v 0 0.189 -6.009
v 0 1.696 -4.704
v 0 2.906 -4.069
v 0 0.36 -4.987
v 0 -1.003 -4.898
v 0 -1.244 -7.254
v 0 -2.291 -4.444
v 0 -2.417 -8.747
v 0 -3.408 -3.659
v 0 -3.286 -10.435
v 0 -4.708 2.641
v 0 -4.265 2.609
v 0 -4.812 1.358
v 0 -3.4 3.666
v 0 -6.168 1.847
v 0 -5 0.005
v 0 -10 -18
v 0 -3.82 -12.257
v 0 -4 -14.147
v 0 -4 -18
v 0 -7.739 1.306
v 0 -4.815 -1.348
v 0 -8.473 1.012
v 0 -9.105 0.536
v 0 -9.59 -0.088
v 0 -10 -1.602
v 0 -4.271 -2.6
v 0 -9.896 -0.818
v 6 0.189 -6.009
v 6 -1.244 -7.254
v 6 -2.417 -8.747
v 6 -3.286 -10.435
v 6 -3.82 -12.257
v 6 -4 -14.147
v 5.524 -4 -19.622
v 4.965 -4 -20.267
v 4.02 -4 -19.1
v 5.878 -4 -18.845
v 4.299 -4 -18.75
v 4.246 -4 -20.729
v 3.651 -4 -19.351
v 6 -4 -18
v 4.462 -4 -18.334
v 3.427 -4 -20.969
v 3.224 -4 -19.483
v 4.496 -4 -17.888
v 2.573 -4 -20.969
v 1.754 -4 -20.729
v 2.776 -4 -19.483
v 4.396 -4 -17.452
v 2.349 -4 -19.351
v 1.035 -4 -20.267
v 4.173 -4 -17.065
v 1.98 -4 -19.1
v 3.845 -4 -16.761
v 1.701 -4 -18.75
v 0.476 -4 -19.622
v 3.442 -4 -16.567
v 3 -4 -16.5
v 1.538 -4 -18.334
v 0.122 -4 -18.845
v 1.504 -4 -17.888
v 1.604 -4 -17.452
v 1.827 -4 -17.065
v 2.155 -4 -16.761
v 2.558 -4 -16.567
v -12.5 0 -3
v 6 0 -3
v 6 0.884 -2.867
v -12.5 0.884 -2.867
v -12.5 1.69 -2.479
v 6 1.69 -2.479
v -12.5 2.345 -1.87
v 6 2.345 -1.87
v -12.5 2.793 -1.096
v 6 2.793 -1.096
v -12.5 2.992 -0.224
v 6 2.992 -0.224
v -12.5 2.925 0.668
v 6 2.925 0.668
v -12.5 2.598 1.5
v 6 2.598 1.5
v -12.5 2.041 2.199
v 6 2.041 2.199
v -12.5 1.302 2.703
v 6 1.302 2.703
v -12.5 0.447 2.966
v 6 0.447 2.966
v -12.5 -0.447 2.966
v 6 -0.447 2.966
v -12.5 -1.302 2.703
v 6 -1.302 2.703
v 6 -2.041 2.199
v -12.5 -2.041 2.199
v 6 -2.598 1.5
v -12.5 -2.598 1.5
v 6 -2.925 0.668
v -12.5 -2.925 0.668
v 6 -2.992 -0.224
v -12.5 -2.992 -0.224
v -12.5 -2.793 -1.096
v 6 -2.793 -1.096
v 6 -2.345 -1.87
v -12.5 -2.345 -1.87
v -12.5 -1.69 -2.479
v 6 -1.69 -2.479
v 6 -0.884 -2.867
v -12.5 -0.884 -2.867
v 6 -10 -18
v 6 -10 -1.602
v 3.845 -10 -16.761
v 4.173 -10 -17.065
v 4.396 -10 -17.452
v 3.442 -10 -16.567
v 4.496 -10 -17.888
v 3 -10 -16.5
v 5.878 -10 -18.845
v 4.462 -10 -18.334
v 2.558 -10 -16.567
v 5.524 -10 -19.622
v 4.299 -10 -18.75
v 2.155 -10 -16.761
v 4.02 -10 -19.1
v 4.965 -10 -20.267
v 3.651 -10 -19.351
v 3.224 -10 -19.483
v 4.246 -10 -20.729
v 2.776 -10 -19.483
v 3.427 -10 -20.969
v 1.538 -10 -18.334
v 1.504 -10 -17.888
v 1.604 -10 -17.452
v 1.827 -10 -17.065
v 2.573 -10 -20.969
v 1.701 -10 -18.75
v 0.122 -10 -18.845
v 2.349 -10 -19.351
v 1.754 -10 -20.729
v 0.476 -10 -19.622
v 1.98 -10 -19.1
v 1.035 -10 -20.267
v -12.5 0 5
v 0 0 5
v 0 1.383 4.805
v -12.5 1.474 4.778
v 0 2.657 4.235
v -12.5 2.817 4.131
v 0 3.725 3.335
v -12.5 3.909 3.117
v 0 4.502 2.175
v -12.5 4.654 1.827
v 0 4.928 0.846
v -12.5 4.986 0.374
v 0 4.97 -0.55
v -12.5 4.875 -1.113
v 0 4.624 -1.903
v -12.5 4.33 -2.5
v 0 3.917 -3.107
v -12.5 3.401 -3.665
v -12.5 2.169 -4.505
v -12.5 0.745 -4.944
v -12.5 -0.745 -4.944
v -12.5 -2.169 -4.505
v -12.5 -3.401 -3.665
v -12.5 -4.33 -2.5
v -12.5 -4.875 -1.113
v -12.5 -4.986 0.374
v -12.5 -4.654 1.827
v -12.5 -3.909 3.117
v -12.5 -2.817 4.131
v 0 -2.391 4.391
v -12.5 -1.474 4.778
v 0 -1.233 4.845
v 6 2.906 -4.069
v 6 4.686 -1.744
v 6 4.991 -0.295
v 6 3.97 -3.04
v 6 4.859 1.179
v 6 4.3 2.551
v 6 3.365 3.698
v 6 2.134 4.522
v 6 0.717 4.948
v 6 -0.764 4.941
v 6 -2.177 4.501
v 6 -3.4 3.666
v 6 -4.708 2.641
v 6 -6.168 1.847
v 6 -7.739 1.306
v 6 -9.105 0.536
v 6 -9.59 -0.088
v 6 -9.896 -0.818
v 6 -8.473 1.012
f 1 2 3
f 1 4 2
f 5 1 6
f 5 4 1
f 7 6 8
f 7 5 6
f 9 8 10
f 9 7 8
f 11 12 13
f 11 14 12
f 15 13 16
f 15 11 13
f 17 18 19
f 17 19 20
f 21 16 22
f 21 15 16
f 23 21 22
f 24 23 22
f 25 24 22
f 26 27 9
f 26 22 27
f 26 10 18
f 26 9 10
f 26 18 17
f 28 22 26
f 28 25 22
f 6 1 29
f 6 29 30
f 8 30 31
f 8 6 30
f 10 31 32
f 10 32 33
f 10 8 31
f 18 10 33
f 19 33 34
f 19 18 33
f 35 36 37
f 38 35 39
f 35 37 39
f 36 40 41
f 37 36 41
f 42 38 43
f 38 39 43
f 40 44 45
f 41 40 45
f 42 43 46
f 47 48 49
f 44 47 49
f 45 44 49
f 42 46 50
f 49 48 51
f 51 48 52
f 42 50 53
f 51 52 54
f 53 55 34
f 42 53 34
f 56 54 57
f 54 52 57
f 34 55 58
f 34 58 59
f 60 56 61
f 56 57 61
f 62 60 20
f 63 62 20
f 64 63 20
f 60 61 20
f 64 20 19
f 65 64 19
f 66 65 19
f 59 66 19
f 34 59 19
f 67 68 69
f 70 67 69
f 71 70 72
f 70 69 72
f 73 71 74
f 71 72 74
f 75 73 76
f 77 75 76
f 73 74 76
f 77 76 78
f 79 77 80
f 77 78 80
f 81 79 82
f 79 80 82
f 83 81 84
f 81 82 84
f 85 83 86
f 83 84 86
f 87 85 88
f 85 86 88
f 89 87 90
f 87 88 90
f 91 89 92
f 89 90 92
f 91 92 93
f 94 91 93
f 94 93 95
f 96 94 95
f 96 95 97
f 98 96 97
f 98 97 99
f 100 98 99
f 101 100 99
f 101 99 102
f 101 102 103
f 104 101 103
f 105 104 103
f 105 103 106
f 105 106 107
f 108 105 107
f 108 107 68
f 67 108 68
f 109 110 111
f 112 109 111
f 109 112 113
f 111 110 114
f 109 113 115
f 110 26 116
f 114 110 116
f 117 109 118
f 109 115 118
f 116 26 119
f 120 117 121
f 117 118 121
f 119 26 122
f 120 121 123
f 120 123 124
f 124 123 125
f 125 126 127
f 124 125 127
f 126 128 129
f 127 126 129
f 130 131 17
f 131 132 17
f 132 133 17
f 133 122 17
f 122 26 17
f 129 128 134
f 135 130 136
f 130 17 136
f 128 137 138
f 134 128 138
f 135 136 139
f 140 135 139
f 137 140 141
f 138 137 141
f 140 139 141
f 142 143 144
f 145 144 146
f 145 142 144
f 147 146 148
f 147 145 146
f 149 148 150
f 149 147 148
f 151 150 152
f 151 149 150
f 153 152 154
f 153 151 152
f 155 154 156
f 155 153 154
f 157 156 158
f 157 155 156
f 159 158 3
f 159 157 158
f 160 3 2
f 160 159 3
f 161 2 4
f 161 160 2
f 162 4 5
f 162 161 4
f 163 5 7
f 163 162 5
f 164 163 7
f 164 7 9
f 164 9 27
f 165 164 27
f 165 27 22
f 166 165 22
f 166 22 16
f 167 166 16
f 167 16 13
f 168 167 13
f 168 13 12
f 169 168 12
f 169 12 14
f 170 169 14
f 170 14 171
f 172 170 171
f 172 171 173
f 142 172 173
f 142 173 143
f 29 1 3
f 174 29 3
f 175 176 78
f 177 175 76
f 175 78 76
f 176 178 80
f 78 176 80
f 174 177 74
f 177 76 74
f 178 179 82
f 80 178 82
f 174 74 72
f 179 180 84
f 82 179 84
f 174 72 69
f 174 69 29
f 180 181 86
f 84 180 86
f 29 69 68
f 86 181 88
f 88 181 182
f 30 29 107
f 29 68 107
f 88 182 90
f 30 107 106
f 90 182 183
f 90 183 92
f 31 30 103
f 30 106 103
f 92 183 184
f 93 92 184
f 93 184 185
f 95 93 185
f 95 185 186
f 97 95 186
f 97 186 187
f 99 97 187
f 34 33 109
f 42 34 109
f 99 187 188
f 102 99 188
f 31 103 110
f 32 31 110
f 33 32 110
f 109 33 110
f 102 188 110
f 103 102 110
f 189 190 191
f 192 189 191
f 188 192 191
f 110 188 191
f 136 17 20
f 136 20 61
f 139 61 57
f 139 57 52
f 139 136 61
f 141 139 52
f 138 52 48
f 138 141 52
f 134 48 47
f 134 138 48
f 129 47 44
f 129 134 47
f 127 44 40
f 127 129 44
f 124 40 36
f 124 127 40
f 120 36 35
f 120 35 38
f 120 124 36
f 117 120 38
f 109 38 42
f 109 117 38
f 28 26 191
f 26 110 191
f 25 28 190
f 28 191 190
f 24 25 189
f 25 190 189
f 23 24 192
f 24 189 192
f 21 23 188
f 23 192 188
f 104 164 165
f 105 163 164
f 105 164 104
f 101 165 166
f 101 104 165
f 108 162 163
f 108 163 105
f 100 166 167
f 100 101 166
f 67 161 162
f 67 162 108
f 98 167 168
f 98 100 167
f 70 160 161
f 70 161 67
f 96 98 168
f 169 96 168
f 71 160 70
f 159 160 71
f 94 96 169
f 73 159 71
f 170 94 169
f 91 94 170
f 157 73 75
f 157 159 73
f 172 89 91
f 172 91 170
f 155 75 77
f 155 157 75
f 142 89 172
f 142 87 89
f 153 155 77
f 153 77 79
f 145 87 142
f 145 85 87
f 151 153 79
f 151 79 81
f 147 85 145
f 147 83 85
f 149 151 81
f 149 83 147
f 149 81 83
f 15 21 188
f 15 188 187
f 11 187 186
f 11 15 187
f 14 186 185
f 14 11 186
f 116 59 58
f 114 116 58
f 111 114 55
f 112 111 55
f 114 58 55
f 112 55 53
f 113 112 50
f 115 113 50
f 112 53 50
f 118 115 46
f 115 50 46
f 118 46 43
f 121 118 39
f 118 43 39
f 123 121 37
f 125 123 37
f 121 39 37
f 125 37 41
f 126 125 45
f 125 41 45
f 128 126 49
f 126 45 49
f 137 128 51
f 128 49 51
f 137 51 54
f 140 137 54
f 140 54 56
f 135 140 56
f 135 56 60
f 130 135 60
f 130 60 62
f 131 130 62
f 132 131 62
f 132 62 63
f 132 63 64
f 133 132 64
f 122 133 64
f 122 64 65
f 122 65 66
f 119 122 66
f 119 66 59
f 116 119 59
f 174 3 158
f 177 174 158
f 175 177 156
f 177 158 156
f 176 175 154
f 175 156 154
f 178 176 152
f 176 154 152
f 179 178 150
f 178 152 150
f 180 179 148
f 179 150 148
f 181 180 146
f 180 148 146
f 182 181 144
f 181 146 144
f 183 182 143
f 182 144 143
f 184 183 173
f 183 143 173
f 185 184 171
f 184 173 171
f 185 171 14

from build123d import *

# Parameters (mm, degrees)
BOSS_EXTRU_1_DEPTH      = 6
CONG_3_R                = 10
BOSS_EXTRU_2_START      = 12.5
ESQUISSE2_R             = 5
BOSS_EXTRU_2_DEPTH      = 12.5
ESQUISSE3_R             = 3
ENL_V_MAT_EXTRU_1_DEPTH = 27.424420523
BOSS_EXTRU_3_DEPTH      = 6
CONG_5_R                = 10
ESQUISSE5_R             = 1.5
ENL_V_MAT_EXTRU_2_DEPTH = 27.043233286
CONG_7_R                = 3


with BuildPart() as part:
    # Esquisse1 → Boss.-Extru.1 (new body)
    with BuildSketch(Plane(origin=(0, 0, 0), x_dir=(0, 0, -1), z_dir=(1, 0, 0))):
        with BuildLine():
            Line((-1, -4.898979486), (-1, -10))
            Line((-1, -10), (16, -10))
            Line((16, -10), (14, -4))
            Line((14, -4), (9, -4))
            Line((9, -4), (4.06913018, 2.905542906))
            ThreePointArc((4.06913018, 2.905542906), (-4.193153044, 2.723502808), (-1, -4.898979486))
        make_face()
    extrude(amount=BOSS_EXTRU_1_DEPTH)

    # Congé3
    # the kernel refuses this fillet: 10 mm, written as the material it adds along each edge
    with BuildSketch(Plane(origin=(0, -4.898979486, 1), x_dir=(0, -1, 0), z_dir=(1, 0, 0))) as cong_3_piece_1:
        with BuildLine():
            CenterArc((5.301220936, -9.997995789), CONG_3_R, 91.147140557, 41.697546603)
            Line((-1.498912679, -2.665998596), (-1.634915351, -2.519358652))
            ThreePointArc((-1.634915351, -2.519358652), (-0.714939835, -1.35240562), (-0.195959179, 0.04))
            Line((-0.195959179, 0.04), (0, 0.2))
            ThreePointArc((0, 0.2), (2.550510257, 0.2), (5.097016506, 0.199959916))
            Line((5.097016506, 0.199959916), (5.101020514, 0))
        make_face()
    extrude(amount=6)

    # Esquisse2 → Boss.-Extru.2 (add)
    with BuildSketch(Plane.ZY.offset(BOSS_EXTRU_2_START)):
        Circle(ESQUISSE2_R)
    extrude(amount=-BOSS_EXTRU_2_DEPTH)

    # Esquisse3 → Enlèv. mat.-Extru.1 (cut, through all)
    with BuildSketch(Plane(origin=(6, 0, 0), x_dir=(0, 0, -1), z_dir=(1, 0, 0))):
        Circle(ESQUISSE3_R)
    extrude(amount=-ENL_V_MAT_EXTRU_1_DEPTH, mode=Mode.SUBTRACT)

    # Esquisse4 → Boss.-Extru.3 (add)
    with BuildSketch(Plane.XZ.offset(10)):
        with BuildLine():
            Line((6, -11), (0, -11))
            Line((0, -11), (0, -18))
            ThreePointArc((0, -18), (3, -21), (6, -18))
            Line((6, -18), (6, -11))
        make_face()
    extrude(amount=-BOSS_EXTRU_3_DEPTH)

    # Congé5
    # the kernel refuses this fillet: 10 mm, written as the material it adds along each edge
    with BuildSketch(Plane(origin=(0, -4, -9), x_dir=(0, 0.813826036051075, 0.5811085811149191), z_dir=(1, 0, 0))) as cong_5_piece_1:
        with BuildLine():
            CenterArc((CONG_5_R * 0.514718625761, -CONG_5_R), CONG_5_R, 90, 54.471447841)
            Line((-CONG_5_R * 0.29910741029, -CONG_5_R * 0.418891418885), (0, 0))
            Line((0, 0), (CONG_5_R * 0.514718625761, 0))
        make_face()
    extrude(amount=6)

    # Esquisse5 → Enlèv. mat.-Extru.2 (cut, through all)
    with BuildSketch(Plane(origin=(0, -4, 0), x_dir=(1, 0, 0), z_dir=(0, 1, 0))):
        with Locations(Location((3, 18, 0), (0, 0, 270))):
            Circle(ESQUISSE5_R)
    extrude(amount=-ENL_V_MAT_EXTRU_2_DEPTH, mode=Mode.SUBTRACT)

    # Congé7
    cong_7_edges = [part.edges().sort_by_distance(p)[0] for p in [
        (3, -10, 1),
    ]]
    fillet(cong_7_edges, radius=CONG_7_R)


solid = part.part
